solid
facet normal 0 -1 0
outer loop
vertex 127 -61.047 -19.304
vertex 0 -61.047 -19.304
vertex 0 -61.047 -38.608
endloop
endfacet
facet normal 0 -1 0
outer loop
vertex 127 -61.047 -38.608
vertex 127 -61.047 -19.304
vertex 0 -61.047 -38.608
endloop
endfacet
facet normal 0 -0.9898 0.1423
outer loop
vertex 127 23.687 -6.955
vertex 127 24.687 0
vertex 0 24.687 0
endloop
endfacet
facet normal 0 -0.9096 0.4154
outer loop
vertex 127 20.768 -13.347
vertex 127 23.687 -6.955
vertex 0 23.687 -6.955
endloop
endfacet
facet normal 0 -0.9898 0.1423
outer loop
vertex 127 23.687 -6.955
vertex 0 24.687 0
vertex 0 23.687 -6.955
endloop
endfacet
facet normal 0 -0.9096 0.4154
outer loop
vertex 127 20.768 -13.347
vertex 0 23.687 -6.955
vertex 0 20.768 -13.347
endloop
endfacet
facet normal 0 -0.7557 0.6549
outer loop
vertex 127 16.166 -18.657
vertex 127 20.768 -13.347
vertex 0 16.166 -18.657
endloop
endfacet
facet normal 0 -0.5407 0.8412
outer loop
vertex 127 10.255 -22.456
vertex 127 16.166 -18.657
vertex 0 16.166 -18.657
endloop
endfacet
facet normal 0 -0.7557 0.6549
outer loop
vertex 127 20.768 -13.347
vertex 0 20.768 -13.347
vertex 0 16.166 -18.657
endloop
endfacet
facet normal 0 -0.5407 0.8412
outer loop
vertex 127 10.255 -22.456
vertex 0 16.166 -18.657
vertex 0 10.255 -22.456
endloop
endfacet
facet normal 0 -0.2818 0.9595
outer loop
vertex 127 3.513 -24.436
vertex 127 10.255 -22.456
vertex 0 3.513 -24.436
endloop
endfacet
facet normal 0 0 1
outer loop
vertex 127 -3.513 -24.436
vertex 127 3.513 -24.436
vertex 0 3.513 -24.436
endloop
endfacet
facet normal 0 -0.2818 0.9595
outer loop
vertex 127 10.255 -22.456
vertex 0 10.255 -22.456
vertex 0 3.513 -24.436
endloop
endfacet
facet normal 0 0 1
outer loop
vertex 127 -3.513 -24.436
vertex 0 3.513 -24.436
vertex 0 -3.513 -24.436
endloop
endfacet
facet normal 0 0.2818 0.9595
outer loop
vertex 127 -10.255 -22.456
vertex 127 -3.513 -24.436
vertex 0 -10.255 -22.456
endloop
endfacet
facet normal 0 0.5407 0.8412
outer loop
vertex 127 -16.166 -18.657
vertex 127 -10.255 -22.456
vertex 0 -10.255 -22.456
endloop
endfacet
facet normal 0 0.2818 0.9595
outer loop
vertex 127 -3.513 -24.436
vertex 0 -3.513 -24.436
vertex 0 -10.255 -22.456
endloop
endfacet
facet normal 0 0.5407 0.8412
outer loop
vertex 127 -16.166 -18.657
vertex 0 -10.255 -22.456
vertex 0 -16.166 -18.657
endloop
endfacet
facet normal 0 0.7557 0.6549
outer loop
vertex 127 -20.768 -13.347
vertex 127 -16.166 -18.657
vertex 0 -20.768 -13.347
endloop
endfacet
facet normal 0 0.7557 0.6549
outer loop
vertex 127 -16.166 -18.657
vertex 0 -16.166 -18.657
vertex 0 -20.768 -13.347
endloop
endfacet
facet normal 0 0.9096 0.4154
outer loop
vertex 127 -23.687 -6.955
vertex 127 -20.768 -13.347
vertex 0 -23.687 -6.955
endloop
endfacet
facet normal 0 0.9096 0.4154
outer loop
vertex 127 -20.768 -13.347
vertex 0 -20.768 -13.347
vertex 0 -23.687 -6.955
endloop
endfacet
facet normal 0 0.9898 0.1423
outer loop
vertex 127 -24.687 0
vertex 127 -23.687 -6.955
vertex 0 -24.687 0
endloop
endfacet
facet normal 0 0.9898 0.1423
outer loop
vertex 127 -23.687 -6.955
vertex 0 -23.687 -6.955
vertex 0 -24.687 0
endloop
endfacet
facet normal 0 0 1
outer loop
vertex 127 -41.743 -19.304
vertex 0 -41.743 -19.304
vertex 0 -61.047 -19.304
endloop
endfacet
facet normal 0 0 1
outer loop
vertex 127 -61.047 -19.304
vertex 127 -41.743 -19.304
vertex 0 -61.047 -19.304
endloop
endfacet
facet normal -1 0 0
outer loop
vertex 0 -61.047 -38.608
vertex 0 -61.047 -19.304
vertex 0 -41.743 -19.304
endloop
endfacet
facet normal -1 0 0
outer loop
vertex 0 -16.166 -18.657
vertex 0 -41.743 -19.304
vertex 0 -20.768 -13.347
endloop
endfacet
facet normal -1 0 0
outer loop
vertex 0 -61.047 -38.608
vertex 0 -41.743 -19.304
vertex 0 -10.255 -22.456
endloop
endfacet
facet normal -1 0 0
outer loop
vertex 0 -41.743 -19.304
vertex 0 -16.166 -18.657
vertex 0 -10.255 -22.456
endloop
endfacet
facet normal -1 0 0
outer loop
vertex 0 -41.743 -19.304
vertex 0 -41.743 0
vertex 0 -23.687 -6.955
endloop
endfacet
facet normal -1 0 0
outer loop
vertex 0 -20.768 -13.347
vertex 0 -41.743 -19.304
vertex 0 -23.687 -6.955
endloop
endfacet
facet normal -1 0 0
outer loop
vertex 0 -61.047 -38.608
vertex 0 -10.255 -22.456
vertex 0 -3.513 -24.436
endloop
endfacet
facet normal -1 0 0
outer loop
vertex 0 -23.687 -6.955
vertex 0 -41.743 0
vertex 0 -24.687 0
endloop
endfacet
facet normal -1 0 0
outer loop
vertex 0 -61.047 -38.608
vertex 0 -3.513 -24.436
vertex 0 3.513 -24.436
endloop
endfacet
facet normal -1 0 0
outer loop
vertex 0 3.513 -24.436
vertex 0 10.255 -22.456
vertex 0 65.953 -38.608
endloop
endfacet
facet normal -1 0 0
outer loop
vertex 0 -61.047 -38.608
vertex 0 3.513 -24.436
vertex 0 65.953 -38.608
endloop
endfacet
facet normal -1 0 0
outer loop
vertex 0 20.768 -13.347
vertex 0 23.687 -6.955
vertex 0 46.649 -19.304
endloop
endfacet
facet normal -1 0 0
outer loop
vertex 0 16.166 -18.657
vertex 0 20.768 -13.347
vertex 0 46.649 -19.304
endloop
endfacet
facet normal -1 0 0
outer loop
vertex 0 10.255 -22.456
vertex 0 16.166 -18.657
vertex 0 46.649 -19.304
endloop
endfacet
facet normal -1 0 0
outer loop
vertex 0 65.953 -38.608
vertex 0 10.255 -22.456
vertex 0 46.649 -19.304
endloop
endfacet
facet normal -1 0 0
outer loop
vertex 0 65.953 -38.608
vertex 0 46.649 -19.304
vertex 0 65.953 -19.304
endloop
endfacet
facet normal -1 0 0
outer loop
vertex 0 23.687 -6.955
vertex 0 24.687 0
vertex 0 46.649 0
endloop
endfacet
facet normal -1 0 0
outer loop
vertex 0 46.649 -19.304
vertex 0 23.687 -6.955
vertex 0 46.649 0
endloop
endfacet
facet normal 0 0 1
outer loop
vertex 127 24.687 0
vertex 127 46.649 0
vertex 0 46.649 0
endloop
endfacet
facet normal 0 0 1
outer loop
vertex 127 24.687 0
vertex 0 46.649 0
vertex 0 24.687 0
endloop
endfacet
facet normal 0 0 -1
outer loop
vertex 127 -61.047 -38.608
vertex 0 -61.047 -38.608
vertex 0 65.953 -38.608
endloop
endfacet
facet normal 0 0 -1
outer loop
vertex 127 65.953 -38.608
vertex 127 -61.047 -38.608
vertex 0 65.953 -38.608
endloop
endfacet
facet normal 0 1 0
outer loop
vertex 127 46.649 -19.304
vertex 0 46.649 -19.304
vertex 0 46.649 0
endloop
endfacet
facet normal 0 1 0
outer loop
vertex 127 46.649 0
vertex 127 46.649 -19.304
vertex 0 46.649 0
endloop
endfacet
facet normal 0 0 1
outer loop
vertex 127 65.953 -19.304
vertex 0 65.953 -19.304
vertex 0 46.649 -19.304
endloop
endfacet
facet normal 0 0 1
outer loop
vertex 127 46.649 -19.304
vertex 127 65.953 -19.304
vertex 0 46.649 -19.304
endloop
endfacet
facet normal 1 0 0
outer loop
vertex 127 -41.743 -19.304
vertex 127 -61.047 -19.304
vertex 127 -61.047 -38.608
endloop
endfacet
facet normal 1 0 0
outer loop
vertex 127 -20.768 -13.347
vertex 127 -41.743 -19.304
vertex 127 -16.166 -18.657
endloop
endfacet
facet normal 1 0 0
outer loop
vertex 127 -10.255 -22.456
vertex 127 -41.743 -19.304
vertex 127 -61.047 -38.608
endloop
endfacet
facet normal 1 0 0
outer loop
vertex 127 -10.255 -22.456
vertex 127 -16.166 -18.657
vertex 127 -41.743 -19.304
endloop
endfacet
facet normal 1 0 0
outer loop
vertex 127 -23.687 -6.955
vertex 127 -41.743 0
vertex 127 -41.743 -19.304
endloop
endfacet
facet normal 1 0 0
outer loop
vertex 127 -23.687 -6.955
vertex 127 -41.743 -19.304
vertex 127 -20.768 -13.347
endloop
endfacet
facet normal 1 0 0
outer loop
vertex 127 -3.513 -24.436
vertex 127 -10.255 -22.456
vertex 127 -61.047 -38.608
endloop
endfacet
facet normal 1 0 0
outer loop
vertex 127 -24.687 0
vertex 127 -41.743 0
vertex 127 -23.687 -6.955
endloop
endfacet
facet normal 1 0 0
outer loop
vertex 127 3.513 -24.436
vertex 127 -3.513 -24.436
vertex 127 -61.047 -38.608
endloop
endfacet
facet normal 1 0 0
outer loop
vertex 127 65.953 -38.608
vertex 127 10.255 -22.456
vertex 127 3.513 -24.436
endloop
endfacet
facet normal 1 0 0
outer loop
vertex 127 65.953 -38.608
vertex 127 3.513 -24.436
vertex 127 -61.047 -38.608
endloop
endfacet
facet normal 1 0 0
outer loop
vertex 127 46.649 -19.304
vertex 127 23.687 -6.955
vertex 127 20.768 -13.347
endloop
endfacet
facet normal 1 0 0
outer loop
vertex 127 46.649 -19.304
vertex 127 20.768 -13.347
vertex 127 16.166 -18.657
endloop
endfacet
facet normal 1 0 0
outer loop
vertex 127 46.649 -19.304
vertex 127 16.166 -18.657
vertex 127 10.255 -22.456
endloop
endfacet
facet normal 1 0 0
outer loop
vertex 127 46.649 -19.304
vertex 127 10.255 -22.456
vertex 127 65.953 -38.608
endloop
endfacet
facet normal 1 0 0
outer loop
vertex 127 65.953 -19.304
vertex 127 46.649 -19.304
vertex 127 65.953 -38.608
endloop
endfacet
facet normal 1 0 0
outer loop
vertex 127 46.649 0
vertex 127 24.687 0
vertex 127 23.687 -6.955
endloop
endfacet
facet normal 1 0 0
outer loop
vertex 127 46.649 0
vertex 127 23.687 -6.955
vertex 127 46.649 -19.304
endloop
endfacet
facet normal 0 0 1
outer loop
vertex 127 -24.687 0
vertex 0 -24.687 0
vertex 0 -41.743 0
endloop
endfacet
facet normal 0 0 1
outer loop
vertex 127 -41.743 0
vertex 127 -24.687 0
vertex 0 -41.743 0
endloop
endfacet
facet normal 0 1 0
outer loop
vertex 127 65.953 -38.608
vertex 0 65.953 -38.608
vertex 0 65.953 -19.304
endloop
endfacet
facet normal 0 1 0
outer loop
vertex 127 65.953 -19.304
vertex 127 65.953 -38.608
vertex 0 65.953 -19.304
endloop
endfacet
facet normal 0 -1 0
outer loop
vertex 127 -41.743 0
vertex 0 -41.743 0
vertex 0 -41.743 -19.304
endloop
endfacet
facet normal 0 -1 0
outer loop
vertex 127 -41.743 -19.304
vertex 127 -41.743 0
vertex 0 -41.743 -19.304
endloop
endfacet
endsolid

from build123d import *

# Parameters (mm, degrees)
F1_DEPTH = 127


with BuildPart() as f1:
    # F0 (on Right) → F1 (new body)
    with BuildSketch(Plane.YZ):
        with BuildLine():
            Line((-41.742593, -19.304), (-61.046593, -19.304))
            Line((-61.046593, -19.304), (-61.046593, -38.608))
            Line((-61.046593, -38.608), (65.953407, -38.608))
            Line((65.953407, -38.608), (65.953407, -19.304))
            Line((65.953407, -19.304), (46.649407, -19.304))
            Line((46.649407, -19.304), (46.649407, 0))
            Line((46.649407, 0), (40.045407, 0))
            Line((40.045407, 0), (24.686914, 0))
            ThreePointArc((24.686914, 0), (0, -24.686914), (-24.686914, 0))
            Line((-24.686914, 0), (-35.138593, 0))
            Line((-35.138593, 0), (-41.742593, 0))
            Line((-41.742593, 0), (-41.742593, -19.304))
        make_face()
    extrude(amount=F1_DEPTH)


solid = f1.part
